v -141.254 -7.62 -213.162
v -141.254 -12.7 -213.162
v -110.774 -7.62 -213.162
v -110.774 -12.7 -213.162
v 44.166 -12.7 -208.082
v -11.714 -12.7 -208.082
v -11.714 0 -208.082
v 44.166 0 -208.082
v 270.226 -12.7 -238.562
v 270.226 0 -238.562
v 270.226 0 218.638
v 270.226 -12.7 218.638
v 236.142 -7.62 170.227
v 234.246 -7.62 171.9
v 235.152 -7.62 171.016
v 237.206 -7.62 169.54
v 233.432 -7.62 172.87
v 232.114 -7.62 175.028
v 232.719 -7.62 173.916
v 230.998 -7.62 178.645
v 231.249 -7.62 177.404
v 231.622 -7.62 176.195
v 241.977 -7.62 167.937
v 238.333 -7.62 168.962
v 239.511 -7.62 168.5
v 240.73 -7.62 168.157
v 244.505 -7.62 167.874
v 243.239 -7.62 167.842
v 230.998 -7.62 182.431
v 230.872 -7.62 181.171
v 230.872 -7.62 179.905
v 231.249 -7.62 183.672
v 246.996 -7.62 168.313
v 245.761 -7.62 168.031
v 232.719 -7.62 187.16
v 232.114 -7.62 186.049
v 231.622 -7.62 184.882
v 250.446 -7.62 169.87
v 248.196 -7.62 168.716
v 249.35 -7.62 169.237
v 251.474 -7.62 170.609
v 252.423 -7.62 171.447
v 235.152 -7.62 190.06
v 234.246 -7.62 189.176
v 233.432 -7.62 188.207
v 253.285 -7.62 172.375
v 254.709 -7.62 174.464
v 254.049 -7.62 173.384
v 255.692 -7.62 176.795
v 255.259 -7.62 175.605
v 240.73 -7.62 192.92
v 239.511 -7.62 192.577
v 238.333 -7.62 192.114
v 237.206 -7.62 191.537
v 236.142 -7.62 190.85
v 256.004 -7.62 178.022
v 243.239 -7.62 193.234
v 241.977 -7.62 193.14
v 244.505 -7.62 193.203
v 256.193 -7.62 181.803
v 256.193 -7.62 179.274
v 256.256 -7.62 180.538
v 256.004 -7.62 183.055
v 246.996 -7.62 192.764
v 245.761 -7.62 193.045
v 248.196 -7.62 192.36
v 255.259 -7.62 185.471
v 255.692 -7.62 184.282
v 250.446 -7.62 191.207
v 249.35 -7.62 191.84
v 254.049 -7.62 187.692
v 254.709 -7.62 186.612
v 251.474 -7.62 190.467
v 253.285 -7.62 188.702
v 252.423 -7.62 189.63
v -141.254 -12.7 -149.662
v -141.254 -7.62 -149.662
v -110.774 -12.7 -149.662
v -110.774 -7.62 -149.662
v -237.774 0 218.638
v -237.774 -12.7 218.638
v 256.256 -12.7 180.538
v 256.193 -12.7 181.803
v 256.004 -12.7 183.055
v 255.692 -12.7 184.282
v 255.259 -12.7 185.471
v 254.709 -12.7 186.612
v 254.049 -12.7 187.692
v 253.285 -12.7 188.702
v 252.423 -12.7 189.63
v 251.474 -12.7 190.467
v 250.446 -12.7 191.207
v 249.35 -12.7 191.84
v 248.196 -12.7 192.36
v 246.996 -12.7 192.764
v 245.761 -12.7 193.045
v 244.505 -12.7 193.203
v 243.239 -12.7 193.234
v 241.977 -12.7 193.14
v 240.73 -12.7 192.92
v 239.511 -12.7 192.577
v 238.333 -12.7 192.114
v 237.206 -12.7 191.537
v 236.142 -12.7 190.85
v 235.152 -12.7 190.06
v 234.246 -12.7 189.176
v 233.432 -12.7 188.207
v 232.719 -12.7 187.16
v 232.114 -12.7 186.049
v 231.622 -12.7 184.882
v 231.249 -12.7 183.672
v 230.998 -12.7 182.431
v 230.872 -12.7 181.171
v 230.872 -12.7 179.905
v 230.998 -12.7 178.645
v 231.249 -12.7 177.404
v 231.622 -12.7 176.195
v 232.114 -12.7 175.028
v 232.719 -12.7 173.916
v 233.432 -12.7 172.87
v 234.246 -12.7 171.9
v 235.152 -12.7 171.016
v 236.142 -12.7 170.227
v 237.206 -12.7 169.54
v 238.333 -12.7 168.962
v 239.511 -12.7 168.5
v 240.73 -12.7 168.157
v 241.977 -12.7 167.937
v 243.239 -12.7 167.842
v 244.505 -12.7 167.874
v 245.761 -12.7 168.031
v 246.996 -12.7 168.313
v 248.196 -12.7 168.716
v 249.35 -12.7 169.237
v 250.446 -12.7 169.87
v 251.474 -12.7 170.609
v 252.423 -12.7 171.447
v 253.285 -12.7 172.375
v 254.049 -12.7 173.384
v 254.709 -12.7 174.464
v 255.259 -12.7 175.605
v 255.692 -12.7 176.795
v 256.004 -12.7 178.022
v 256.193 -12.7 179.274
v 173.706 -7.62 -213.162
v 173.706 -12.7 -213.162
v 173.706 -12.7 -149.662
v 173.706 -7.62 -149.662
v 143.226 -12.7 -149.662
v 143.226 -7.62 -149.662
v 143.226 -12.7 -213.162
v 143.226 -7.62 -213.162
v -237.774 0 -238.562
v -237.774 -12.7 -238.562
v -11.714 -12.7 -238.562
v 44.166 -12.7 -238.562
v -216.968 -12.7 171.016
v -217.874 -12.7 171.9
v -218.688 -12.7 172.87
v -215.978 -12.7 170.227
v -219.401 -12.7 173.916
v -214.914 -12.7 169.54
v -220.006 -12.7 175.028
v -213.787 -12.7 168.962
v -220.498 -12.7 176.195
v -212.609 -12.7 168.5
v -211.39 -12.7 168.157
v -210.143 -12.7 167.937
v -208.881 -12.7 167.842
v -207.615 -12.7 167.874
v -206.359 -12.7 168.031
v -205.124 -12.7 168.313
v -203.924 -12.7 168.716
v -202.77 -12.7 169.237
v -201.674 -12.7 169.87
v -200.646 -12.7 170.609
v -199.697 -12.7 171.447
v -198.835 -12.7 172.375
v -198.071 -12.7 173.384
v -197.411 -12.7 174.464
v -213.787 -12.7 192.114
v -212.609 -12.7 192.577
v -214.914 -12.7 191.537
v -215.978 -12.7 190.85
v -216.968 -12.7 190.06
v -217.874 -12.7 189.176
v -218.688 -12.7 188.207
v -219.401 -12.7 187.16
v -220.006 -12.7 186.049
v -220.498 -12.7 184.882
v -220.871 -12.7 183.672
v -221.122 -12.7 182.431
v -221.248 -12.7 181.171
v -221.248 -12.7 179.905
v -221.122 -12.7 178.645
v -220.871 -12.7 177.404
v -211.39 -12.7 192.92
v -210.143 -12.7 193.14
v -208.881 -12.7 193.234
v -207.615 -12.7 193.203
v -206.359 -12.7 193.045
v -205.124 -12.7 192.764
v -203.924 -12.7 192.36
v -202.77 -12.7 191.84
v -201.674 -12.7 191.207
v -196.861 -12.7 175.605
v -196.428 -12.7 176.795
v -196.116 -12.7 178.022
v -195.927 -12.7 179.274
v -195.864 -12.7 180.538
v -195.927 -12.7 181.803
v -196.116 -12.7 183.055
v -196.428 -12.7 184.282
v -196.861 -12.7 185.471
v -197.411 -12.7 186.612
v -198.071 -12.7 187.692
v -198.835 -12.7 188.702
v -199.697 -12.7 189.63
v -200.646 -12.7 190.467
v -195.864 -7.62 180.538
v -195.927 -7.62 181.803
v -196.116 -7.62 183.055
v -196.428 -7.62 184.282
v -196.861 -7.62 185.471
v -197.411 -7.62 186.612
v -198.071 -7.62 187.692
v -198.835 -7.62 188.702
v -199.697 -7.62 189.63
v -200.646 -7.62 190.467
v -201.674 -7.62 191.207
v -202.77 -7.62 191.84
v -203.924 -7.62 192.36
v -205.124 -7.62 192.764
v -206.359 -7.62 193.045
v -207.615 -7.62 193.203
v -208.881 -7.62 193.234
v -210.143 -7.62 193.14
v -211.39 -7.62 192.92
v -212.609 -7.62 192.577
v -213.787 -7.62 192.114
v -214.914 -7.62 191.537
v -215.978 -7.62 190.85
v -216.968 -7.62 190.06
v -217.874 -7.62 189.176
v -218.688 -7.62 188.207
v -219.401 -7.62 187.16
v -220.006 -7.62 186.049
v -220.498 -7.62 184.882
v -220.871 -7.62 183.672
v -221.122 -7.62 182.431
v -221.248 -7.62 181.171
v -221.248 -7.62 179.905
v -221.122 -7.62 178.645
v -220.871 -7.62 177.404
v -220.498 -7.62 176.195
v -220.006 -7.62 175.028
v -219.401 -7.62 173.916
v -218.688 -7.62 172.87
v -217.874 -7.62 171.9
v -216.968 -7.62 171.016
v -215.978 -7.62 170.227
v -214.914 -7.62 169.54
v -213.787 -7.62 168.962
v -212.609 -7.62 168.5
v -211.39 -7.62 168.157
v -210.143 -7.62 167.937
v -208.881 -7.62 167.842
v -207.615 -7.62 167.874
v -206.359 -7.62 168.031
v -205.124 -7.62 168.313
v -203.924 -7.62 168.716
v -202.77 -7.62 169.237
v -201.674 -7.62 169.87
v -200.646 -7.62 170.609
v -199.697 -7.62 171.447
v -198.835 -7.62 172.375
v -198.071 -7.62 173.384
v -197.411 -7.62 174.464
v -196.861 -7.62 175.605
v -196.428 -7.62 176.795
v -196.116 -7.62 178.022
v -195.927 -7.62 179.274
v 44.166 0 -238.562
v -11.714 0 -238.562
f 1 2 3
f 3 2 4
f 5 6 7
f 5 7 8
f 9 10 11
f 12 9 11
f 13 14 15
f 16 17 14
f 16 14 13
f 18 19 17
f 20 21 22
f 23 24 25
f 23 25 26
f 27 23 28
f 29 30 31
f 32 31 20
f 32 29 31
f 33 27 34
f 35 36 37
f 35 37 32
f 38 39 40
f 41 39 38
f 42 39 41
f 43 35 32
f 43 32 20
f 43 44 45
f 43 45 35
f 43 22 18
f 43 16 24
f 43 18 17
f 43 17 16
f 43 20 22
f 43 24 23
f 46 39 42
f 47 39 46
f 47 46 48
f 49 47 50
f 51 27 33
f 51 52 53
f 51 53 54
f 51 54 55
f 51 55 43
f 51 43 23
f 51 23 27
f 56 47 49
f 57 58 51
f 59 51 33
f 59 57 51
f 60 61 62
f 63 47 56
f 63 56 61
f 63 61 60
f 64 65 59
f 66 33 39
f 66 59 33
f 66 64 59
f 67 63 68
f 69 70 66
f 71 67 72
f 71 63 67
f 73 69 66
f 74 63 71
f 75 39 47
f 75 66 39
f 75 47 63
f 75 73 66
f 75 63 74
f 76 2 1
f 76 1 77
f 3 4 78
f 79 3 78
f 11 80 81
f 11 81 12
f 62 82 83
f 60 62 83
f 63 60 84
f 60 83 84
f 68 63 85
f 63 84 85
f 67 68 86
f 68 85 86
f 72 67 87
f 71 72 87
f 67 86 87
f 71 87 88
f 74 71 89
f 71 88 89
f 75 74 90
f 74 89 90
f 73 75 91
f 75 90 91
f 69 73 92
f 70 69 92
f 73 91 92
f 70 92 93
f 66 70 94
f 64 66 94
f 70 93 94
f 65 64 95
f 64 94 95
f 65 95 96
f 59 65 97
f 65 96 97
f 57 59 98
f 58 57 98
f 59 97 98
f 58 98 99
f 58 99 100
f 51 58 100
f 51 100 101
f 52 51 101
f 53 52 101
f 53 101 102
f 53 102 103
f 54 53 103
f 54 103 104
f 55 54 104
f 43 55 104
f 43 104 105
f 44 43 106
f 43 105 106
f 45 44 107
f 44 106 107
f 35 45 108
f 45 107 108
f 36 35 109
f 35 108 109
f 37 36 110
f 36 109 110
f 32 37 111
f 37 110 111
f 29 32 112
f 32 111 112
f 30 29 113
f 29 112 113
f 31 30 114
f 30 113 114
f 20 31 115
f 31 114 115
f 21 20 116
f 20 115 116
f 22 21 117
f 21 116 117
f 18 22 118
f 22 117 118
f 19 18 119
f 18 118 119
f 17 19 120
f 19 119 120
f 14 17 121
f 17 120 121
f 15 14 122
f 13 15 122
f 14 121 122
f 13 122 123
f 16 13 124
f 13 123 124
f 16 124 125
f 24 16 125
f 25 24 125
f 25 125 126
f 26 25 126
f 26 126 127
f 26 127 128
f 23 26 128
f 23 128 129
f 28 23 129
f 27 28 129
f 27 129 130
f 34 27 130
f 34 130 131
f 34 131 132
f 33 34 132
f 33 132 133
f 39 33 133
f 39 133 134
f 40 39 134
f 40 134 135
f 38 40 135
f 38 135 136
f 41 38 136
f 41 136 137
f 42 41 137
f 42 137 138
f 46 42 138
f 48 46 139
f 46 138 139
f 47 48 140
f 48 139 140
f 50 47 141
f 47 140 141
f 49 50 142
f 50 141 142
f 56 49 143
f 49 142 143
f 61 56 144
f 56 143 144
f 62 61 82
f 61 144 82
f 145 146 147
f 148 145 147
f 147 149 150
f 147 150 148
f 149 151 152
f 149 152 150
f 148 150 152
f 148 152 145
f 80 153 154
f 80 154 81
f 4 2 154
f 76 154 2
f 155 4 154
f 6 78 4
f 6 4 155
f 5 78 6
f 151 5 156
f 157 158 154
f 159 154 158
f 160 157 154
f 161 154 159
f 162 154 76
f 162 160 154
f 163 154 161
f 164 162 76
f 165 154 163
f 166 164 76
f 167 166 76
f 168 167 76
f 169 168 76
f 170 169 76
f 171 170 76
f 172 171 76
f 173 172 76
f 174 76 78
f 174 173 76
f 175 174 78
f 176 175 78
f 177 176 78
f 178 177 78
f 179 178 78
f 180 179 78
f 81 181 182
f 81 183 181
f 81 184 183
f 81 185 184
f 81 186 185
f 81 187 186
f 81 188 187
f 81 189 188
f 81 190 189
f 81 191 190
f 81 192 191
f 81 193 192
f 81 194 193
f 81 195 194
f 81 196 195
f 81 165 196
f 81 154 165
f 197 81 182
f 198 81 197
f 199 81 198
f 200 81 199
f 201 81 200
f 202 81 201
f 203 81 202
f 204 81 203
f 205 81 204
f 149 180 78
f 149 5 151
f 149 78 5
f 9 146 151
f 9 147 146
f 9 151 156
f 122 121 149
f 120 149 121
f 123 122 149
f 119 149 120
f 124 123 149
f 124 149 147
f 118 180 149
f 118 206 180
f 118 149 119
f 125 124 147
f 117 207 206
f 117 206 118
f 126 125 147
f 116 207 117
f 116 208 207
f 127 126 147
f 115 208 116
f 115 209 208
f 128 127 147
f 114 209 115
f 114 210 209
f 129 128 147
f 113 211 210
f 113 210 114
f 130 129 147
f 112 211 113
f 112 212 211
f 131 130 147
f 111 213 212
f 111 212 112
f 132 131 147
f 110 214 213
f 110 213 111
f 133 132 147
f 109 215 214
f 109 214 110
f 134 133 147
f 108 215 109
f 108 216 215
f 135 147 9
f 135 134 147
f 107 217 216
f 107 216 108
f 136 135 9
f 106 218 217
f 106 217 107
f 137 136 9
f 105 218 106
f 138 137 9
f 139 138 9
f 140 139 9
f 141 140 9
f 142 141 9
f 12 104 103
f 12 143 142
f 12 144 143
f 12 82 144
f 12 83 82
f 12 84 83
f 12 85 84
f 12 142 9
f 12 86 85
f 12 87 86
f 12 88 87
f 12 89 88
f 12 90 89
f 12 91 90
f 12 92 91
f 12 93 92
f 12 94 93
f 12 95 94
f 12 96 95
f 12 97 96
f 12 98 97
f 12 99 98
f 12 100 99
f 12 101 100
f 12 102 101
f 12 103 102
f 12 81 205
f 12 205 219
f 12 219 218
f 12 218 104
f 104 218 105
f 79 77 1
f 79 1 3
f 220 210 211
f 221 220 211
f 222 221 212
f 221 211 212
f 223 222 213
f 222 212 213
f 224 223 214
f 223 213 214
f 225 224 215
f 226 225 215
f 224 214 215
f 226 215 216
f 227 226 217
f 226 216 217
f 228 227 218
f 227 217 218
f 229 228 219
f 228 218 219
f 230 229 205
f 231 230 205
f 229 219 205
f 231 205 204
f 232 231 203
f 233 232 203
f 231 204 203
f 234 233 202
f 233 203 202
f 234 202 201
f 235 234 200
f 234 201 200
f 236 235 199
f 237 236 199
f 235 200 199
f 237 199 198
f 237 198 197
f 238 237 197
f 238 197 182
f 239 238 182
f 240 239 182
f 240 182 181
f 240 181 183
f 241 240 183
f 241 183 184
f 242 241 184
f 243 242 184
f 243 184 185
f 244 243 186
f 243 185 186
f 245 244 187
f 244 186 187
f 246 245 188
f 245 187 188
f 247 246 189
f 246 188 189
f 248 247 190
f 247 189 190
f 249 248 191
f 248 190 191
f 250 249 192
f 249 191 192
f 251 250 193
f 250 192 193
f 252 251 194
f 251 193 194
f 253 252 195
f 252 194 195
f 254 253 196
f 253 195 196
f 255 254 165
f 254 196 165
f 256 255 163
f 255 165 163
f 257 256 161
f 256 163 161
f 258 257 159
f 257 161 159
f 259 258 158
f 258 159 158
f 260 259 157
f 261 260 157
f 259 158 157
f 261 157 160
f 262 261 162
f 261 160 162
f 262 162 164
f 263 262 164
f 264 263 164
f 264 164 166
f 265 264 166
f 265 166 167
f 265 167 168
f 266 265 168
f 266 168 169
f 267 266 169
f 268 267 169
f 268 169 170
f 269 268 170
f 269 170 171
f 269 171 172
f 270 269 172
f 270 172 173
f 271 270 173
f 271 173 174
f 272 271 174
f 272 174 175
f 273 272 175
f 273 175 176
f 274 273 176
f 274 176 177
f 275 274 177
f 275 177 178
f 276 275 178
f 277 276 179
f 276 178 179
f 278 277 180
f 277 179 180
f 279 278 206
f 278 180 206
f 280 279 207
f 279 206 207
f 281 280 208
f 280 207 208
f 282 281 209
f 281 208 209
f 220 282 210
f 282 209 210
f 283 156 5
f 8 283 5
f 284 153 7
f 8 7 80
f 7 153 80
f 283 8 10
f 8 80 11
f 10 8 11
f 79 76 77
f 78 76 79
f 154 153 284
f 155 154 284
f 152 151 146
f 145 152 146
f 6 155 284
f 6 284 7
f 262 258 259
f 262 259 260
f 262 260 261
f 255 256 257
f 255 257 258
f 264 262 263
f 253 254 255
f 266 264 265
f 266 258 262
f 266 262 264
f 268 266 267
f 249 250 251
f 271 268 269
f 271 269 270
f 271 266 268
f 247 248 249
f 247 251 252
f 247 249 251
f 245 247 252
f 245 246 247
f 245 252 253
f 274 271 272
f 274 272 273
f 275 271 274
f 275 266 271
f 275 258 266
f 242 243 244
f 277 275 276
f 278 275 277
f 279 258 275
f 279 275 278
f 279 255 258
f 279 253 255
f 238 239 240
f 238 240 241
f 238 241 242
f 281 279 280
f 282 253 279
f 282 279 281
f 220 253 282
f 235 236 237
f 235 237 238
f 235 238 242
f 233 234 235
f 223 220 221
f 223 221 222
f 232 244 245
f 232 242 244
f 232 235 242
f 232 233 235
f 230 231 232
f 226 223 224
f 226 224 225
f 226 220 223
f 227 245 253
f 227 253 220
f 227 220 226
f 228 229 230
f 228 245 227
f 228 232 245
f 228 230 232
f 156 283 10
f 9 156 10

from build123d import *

# Parameters (mm, degrees)
F0_W     = 508
F0_H     = 457.2
F1_DEPTH = 12.7
F2_W     = 30.48
F2_H     = 63.5
F3_DEPTH = 5.08
F2_R     = 12.7
F4_DEPTH = 5.08
F2_W_2   = 55.88
F2_H_2   = 30.48
F5_DEPTH = 12.7


with BuildPart() as f1:
    # F0 (on Front) → F1 (new body)
    with BuildSketch(Plane.XZ):
        with Locations((16.225851, -9.961791)):
            Rectangle(F0_W, F0_H)
    extrude(amount=F1_DEPTH)

    # F2 (on face) → F3 (cut)
    with BuildSketch(Plane.XZ.offset(12.7)):
        with Locations((158.465851, -181.411791)):
            Rectangle(F2_W, F2_H)
        with Locations((-126.014149, -181.411791)):
            Rectangle(F2_W, F2_H)
    extrude(amount=-F3_DEPTH, mode=Mode.SUBTRACT)

    # F2 (on face) → F4 (cut)
    with BuildSketch(Plane.XZ.offset(12.7)):
        with Locations((-208.564149, 180.538209)):
            Circle(F2_R)
        with Locations((243.555851, 180.538209)):
            Circle(F2_R)
    extrude(amount=-F4_DEPTH, mode=Mode.SUBTRACT)

    # F2 (on face) → F5 (cut)
    with BuildSketch(Plane.XZ.offset(12.7)):
        with Locations((16.225851, -223.321791)):
            Rectangle(F2_W_2, F2_H_2)
    extrude(amount=-F5_DEPTH, mode=Mode.SUBTRACT)


solid = f1.part
